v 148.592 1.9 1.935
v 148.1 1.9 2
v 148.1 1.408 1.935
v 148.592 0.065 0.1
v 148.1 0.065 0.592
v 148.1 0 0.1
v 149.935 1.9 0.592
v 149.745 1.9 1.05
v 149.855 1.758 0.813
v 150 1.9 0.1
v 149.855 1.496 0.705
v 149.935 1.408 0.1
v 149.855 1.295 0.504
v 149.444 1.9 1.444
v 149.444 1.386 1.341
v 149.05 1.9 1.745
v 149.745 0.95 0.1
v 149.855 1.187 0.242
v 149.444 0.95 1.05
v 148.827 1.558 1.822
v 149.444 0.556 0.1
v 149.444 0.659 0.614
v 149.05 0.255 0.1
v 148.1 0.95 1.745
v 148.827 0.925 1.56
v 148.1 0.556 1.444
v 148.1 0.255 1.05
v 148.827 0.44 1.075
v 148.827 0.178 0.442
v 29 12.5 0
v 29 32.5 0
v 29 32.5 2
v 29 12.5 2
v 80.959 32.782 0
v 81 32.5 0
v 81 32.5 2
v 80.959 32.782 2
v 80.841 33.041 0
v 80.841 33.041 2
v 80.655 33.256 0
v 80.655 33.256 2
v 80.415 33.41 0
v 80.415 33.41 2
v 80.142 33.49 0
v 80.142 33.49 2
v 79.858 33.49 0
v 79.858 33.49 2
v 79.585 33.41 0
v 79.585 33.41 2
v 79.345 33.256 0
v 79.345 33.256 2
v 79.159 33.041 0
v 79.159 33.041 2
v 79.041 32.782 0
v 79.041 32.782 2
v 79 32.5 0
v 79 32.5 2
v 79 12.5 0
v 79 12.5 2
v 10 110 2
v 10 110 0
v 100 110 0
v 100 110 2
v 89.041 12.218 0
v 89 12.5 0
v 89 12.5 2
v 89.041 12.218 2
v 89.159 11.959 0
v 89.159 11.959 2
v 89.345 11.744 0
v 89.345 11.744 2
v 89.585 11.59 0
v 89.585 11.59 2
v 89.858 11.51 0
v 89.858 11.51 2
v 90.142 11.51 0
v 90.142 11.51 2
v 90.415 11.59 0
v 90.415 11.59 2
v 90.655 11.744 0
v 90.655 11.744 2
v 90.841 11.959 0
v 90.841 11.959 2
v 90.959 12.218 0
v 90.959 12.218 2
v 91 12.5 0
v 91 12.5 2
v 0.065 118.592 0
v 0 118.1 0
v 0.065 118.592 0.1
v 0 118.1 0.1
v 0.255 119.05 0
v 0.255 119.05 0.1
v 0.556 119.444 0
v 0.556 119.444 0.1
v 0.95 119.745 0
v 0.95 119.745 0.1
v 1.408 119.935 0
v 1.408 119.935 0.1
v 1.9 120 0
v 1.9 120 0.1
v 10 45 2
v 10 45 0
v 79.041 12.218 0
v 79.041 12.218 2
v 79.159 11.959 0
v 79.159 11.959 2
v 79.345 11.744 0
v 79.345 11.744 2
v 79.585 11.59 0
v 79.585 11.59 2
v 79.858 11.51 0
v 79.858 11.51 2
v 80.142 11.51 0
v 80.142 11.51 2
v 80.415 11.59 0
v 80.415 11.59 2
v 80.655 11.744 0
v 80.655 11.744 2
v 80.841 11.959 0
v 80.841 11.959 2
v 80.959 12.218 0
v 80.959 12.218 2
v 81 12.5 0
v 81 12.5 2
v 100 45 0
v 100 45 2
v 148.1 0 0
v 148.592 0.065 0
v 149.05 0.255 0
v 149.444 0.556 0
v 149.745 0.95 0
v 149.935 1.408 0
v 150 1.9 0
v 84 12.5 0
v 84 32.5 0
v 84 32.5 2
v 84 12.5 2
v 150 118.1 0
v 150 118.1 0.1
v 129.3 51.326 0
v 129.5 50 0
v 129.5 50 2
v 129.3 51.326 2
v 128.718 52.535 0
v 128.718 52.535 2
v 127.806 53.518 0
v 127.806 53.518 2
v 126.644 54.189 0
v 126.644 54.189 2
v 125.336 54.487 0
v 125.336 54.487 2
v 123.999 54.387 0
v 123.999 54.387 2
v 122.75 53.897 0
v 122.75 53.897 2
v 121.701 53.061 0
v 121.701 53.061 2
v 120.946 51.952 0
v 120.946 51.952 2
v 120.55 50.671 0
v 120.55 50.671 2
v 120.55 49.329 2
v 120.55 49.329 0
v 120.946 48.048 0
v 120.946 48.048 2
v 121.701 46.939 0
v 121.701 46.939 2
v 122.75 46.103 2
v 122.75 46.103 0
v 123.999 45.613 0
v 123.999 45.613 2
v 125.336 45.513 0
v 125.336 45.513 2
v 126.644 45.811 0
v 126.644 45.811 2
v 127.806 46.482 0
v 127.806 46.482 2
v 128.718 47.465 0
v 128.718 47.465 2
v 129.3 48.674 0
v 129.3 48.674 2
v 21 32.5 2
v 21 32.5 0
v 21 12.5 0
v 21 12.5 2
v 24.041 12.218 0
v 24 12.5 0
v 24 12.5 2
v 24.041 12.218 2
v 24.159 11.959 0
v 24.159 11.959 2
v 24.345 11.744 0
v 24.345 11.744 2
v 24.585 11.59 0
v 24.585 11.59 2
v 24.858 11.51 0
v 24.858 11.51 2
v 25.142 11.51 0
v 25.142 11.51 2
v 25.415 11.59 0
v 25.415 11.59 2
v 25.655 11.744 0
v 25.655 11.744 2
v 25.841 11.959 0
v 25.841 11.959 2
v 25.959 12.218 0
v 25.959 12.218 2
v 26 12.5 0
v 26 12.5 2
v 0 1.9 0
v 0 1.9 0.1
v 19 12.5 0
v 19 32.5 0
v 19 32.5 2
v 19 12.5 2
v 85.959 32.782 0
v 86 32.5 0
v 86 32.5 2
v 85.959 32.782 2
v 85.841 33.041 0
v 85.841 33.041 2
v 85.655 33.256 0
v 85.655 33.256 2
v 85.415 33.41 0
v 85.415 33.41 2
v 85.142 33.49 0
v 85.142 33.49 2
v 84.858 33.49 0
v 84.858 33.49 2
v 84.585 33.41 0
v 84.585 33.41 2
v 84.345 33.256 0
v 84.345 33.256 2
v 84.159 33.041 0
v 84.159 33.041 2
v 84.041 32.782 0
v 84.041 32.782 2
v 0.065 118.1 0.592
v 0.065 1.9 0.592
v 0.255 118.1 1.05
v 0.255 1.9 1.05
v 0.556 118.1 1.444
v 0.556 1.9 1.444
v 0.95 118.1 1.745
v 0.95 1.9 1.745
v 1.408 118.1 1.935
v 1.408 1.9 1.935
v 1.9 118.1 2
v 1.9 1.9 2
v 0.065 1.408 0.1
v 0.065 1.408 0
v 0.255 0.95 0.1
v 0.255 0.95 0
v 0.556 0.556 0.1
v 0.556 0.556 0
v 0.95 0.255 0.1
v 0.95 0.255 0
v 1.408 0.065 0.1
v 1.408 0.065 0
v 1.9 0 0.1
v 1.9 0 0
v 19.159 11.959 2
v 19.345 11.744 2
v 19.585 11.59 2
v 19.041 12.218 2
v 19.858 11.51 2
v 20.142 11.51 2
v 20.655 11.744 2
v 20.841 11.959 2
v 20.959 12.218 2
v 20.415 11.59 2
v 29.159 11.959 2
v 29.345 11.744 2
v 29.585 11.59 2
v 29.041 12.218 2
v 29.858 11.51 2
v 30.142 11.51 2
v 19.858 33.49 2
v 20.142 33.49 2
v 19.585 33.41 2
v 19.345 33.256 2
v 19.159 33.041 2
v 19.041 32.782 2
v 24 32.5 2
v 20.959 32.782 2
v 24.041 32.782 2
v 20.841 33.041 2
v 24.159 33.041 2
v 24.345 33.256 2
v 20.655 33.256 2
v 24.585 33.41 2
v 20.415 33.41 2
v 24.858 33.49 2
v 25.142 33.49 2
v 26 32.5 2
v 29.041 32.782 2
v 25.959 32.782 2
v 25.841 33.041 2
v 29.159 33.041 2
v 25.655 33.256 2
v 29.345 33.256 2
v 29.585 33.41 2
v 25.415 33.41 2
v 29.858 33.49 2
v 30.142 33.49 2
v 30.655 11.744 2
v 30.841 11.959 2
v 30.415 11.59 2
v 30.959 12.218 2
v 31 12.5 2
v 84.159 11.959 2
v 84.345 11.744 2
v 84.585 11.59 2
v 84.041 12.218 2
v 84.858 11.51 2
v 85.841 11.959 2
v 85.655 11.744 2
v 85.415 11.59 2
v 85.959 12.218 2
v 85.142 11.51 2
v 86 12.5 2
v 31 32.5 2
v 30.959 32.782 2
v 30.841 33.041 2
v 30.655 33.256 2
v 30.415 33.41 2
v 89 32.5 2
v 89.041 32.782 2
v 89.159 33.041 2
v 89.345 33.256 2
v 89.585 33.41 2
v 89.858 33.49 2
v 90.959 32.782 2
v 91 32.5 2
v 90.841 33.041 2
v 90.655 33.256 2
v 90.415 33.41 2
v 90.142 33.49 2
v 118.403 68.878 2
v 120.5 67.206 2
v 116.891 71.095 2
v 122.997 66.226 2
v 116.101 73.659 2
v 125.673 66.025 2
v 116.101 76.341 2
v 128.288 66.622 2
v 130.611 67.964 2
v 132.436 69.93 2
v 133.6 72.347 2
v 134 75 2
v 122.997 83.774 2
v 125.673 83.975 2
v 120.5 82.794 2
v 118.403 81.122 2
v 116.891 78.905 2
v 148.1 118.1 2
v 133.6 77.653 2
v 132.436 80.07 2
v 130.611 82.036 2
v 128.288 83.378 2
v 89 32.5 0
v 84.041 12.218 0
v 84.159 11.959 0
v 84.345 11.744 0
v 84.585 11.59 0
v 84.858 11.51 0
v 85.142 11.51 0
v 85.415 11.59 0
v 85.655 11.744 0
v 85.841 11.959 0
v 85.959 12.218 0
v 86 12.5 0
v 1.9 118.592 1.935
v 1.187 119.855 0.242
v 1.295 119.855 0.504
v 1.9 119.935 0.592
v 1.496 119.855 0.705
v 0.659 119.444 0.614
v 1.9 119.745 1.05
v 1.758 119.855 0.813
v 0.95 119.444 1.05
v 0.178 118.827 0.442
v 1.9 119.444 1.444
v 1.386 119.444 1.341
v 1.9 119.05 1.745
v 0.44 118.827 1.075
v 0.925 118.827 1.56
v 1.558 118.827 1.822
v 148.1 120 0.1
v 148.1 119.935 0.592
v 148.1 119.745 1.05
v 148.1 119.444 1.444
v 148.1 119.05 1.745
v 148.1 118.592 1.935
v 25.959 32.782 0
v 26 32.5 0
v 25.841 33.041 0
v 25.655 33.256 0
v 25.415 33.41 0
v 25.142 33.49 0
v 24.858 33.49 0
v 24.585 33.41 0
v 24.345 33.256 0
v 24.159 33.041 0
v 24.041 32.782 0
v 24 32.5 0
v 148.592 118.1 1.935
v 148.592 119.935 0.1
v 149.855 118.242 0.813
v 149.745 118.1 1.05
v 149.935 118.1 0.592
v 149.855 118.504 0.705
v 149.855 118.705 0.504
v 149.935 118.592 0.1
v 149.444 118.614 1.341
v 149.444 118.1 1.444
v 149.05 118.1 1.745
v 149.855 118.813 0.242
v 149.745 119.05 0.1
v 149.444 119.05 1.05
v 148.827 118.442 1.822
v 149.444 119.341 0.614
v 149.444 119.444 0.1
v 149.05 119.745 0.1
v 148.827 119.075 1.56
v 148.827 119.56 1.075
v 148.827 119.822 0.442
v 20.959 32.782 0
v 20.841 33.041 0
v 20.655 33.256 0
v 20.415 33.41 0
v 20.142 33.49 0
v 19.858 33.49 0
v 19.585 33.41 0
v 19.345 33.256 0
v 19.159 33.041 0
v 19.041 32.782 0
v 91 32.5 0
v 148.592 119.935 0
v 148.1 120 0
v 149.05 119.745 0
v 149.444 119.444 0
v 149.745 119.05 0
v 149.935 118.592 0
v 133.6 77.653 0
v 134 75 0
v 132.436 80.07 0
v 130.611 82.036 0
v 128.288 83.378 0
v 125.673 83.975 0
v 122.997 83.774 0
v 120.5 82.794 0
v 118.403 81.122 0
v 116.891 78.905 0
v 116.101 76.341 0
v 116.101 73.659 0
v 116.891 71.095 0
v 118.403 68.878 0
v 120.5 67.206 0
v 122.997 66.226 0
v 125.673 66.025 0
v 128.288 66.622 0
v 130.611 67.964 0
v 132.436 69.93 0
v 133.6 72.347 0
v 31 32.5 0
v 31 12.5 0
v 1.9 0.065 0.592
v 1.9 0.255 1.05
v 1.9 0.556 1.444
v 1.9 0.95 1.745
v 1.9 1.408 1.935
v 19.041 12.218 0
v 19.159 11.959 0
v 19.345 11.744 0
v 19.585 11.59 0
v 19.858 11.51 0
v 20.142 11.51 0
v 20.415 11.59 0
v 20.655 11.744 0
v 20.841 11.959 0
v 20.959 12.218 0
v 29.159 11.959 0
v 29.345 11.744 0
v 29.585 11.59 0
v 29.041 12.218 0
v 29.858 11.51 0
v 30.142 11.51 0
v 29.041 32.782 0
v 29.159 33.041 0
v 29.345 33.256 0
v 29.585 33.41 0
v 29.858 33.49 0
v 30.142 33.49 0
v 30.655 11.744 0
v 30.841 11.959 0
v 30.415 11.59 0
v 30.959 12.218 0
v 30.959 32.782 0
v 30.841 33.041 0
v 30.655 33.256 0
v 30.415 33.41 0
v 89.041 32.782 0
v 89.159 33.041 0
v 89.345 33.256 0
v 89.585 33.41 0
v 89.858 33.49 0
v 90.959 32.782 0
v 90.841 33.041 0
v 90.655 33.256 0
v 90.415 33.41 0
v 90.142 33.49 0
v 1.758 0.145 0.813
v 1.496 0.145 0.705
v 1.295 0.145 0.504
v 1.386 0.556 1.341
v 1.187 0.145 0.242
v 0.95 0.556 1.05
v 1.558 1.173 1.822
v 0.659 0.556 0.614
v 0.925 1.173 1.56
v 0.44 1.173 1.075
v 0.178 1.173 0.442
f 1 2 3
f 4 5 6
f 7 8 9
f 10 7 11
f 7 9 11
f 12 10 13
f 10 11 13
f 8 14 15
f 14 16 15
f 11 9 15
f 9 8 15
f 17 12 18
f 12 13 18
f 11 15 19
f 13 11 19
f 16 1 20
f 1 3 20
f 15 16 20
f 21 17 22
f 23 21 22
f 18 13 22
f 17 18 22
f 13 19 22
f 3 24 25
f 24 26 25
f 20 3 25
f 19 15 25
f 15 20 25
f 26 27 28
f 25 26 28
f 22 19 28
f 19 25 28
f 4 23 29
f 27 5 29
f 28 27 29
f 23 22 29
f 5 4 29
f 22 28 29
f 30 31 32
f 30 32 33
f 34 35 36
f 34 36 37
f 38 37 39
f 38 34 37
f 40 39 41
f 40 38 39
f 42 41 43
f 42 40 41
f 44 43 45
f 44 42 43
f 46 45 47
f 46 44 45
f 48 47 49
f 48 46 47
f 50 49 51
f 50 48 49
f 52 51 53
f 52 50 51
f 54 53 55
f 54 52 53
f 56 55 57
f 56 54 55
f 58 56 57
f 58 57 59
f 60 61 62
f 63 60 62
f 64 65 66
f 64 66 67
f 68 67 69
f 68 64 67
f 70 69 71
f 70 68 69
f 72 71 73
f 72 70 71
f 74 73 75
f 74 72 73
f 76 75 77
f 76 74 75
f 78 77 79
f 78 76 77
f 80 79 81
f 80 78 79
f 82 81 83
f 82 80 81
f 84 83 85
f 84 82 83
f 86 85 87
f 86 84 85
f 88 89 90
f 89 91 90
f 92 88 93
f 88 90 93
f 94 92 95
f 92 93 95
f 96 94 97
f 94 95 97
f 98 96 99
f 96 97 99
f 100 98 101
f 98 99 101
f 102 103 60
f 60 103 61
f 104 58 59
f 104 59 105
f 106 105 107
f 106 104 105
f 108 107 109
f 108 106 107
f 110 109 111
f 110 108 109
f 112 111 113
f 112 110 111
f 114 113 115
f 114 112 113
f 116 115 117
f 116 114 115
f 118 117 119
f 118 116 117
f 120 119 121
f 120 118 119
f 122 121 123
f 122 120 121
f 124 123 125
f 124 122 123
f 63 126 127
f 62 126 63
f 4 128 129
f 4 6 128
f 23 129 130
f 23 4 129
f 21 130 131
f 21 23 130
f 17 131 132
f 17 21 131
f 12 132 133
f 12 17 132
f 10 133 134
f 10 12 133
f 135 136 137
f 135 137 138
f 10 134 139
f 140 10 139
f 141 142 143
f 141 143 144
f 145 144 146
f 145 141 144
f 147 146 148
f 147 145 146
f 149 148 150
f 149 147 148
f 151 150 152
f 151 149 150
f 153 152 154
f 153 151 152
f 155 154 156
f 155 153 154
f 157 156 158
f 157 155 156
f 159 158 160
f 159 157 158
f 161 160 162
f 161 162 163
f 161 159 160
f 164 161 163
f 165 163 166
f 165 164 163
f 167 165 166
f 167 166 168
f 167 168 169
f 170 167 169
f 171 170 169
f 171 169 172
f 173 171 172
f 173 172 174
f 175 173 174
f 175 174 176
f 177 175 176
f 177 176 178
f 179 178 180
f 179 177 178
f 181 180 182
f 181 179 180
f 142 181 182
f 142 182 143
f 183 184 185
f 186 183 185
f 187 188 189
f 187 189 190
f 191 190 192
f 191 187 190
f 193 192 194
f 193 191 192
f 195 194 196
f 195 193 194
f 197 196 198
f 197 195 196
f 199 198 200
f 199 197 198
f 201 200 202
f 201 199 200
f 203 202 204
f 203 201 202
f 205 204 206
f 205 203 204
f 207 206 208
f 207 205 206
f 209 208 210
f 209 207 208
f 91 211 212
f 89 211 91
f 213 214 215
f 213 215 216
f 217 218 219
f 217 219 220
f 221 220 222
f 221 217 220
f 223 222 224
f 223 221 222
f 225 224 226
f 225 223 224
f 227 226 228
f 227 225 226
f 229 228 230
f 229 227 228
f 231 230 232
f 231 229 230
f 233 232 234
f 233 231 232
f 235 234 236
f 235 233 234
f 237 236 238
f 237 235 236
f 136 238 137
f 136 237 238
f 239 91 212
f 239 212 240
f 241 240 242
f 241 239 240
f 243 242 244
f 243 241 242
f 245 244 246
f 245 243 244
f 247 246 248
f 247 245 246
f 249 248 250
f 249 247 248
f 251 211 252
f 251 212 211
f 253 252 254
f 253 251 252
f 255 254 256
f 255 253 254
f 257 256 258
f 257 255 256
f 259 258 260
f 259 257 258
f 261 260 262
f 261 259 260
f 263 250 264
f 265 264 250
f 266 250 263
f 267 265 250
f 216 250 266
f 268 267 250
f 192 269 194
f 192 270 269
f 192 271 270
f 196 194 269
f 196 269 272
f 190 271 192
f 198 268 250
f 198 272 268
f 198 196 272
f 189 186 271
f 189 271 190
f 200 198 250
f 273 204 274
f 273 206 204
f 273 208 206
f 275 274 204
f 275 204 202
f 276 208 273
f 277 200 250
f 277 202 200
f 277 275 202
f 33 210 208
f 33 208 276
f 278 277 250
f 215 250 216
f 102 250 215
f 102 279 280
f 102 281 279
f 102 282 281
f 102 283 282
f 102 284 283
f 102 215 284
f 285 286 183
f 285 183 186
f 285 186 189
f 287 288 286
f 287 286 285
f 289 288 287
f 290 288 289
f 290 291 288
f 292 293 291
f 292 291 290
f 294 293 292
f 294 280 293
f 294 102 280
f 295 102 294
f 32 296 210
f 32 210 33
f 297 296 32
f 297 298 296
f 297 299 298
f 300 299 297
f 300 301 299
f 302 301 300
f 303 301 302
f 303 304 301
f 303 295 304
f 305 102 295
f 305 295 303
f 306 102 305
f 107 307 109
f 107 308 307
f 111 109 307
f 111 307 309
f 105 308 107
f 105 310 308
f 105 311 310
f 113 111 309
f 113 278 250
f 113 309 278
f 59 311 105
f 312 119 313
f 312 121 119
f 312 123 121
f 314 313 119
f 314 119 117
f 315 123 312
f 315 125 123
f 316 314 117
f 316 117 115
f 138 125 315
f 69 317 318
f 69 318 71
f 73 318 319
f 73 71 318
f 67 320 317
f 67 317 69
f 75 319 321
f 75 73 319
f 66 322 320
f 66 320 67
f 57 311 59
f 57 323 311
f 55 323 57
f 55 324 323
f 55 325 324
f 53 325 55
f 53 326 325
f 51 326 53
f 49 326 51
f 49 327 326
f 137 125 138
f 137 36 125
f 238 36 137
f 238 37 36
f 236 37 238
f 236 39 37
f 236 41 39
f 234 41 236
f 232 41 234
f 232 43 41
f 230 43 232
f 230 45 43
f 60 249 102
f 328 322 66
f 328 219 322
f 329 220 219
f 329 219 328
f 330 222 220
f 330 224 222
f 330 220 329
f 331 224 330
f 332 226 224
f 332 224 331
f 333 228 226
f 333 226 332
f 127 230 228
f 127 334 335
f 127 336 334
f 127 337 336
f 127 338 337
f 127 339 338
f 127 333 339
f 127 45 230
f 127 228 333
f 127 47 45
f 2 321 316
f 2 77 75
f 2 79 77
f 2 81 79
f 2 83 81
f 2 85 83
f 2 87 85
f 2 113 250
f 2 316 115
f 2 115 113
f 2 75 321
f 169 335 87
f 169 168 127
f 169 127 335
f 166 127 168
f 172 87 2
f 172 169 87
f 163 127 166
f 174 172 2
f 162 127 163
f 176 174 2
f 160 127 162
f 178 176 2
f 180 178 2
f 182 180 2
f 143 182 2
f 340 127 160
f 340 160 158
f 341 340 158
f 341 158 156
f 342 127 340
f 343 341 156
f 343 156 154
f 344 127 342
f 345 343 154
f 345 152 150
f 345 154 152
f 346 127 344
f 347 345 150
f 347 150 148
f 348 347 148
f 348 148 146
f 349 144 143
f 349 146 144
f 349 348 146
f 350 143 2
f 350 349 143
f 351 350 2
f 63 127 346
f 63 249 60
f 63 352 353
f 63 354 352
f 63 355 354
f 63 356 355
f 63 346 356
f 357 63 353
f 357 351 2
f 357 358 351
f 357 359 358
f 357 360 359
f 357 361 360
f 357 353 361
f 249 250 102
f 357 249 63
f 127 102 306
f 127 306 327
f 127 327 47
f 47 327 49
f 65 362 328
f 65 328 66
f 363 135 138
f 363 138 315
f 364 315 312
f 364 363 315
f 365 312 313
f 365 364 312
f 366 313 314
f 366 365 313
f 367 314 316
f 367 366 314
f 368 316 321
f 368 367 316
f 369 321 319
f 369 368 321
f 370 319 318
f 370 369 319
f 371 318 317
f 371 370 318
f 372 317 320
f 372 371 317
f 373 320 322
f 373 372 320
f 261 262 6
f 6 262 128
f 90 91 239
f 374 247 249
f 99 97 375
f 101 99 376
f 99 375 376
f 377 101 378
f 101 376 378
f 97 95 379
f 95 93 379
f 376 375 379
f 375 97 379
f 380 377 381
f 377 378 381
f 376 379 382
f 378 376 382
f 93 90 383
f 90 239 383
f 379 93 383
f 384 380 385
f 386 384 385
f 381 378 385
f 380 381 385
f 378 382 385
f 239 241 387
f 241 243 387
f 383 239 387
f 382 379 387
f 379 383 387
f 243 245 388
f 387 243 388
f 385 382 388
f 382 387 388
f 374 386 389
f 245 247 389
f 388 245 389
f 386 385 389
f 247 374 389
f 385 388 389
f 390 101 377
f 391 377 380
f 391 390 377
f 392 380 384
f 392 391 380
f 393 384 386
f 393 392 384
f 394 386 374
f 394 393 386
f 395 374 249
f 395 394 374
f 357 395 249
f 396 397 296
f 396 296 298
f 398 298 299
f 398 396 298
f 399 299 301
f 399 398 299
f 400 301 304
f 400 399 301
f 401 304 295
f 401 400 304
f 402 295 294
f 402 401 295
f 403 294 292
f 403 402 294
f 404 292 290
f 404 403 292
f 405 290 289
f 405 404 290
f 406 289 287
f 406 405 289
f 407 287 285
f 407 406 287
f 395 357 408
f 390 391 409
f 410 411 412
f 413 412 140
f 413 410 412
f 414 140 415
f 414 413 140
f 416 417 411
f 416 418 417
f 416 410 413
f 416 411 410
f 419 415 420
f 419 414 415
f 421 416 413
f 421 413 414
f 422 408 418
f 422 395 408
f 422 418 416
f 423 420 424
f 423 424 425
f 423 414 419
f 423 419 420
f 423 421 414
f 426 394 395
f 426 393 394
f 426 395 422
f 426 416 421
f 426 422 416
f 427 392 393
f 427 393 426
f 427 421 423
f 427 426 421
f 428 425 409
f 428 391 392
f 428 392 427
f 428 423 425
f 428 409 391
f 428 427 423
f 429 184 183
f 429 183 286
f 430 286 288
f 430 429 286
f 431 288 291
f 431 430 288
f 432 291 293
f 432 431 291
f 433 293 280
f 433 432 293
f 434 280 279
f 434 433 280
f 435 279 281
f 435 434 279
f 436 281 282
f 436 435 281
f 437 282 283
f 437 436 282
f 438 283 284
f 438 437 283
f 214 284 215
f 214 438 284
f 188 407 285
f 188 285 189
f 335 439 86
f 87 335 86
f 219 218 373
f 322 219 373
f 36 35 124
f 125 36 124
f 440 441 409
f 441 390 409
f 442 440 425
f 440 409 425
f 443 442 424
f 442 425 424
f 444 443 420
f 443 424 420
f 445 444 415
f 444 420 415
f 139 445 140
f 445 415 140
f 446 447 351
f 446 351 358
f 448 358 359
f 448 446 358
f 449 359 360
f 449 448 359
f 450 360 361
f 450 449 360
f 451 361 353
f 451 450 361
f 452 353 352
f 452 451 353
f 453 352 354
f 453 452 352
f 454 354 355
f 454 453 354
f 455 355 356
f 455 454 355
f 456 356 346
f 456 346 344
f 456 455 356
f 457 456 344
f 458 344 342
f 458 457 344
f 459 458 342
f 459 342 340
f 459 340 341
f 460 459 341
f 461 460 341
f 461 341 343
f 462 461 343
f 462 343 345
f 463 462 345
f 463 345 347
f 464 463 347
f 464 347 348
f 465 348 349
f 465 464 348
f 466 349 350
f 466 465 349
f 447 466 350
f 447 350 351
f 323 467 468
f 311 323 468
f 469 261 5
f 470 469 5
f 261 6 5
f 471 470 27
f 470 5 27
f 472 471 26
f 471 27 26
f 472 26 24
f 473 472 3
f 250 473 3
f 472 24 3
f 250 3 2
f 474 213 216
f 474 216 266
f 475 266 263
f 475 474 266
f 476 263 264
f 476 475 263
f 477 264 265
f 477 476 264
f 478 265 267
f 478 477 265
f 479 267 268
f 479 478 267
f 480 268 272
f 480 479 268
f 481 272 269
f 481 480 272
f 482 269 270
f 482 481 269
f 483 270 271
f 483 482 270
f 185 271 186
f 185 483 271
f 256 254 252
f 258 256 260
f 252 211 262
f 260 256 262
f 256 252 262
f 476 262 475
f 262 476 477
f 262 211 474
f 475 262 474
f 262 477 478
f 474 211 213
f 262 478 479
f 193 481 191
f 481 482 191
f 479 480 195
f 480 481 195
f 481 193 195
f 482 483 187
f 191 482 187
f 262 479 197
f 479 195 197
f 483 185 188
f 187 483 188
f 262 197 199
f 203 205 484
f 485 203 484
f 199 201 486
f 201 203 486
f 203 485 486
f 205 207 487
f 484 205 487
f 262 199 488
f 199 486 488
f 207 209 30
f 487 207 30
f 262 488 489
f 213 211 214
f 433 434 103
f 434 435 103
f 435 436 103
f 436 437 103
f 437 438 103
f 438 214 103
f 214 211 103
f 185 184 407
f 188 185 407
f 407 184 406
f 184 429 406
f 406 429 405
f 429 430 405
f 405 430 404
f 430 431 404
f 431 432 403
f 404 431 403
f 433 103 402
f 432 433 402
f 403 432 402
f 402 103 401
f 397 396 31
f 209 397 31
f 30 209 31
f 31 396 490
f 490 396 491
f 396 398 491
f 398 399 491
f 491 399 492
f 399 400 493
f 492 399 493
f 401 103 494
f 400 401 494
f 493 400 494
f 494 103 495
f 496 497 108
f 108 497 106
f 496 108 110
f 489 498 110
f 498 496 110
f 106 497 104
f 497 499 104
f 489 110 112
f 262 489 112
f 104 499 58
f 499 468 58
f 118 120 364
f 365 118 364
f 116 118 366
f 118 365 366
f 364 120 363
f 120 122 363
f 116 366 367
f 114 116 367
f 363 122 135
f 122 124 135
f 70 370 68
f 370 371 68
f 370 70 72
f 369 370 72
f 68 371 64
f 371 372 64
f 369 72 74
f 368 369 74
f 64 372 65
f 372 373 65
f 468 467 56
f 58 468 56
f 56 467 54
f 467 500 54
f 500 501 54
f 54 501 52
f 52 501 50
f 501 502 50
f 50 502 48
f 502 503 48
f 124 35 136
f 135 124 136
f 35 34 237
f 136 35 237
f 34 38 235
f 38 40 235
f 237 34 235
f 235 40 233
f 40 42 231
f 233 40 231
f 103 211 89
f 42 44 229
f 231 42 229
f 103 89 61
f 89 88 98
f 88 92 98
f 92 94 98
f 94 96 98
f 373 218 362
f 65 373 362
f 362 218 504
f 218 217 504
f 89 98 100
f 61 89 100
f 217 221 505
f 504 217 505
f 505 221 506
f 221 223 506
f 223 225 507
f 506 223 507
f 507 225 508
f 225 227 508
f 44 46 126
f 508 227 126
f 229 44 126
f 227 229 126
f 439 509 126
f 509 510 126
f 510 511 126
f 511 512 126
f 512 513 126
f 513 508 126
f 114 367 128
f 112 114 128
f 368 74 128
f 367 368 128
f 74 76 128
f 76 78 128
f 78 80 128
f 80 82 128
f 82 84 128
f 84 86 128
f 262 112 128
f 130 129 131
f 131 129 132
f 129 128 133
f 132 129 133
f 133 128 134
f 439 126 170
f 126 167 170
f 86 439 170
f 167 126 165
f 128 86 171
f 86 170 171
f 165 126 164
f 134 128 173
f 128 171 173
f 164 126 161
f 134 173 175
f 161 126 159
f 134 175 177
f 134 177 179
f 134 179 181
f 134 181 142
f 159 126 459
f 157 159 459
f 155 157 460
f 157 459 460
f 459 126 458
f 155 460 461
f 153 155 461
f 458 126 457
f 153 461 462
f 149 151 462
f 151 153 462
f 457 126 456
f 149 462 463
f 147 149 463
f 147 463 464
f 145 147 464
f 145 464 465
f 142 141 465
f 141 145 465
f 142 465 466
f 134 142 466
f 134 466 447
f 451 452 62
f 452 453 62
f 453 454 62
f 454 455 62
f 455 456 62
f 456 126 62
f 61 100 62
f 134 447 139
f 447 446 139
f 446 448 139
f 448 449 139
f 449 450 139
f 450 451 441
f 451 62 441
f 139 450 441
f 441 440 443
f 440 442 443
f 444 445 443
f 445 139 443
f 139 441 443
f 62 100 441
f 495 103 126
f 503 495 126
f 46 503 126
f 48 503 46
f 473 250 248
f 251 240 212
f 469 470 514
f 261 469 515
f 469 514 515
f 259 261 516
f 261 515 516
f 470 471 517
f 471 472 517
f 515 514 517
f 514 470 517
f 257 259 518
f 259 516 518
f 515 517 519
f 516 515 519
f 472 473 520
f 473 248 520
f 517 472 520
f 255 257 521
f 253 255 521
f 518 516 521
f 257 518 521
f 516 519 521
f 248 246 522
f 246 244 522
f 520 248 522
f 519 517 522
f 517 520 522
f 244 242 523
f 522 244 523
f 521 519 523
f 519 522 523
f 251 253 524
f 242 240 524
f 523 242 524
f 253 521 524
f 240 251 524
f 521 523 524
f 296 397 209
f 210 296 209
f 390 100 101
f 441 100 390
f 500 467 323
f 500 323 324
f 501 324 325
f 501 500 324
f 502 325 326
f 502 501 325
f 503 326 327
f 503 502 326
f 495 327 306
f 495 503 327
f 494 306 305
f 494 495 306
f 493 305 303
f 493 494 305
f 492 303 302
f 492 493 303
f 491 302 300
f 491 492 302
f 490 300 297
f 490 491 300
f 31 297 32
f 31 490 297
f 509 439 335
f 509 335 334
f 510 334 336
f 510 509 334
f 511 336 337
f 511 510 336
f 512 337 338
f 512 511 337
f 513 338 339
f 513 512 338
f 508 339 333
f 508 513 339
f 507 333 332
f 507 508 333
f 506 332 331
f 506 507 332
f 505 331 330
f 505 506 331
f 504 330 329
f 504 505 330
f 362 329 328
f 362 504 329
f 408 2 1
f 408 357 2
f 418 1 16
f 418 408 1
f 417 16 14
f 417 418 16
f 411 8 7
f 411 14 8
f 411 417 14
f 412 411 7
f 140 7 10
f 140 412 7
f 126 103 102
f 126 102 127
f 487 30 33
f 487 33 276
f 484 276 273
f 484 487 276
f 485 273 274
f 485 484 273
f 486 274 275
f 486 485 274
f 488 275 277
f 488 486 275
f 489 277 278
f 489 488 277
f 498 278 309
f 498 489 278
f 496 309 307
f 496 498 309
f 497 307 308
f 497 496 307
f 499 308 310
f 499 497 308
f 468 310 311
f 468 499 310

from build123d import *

# Parameters (mm, degrees)
SKETCH_W        = 150
SKETCH_H        = 120
PAD_DEPTH       = 2
SKETCH001_W     = 90
SKETCH001_H     = 65
POCKET_DEPTH    = 2
SKETCH002_R     = 9
POCKET001_DEPTH = 2
SKETCH003_R     = 4.5
POCKET002_DEPTH = 2
POCKET003_DEPTH = 2
POCKET004_DEPTH = 2
POCKET005_DEPTH = 2
POCKET006_DEPTH = 2
POCKET007_DEPTH = 2
POCKET008_DEPTH = 2
FILLET_R        = 1.9


with BuildPart() as part:
    # Sketch → Pad (new body)
    with BuildSketch(Plane.XY):
        with Locations((75, 60)):
            Rectangle(SKETCH_W, SKETCH_H)
    extrude(amount=PAD_DEPTH)

    # Sketch001 → Pocket (cut)
    with BuildSketch(Plane.XY):
        with Locations((55, 77.5)):
            Rectangle(SKETCH001_W, SKETCH001_H)
    extrude(amount=POCKET_DEPTH, mode=Mode.SUBTRACT)

    # Sketch002 → Pocket001 (cut)
    with BuildSketch(Plane.XY):
        with Locations((125, 75)):
            Circle(SKETCH002_R)
    extrude(amount=POCKET001_DEPTH, mode=Mode.SUBTRACT)

    # Sketch003 → Pocket002 (cut)
    with BuildSketch(Plane.XY):
        with Locations((125, 50)):
            Circle(SKETCH003_R)
    extrude(amount=POCKET002_DEPTH, mode=Mode.SUBTRACT)

    # Sketch004 → Pocket003 (cut)
    with BuildSketch(Plane.XY):
        with BuildLine():
            ThreePointArc((21, 32.5), (20, 33.5), (19, 32.5))
            Line((19, 32.5), (19, 12.5))
            ThreePointArc((19, 12.5), (20, 11.5), (21, 12.5))
            Line((21, 32.5), (21, 12.5))
        make_face()
    extrude(amount=POCKET003_DEPTH, mode=Mode.SUBTRACT)

    # Sketch006 → Pocket004 (cut)
    with BuildSketch(Plane.XY):
        with BuildLine():
            ThreePointArc((26, 32.5), (25, 33.5), (24, 32.5))
            Line((24, 32.5), (24, 12.5))
            ThreePointArc((24, 12.5), (25, 11.5), (26, 12.5))
            Line((26, 32.5), (26, 12.5))
        make_face()
    extrude(amount=POCKET004_DEPTH, mode=Mode.SUBTRACT)

    # Sketch008 → Pocket005 (cut)
    with BuildSketch(Plane.XY):
        with BuildLine():
            ThreePointArc((31, 32.5), (30, 33.5), (29, 32.5))
            Line((29, 32.5), (29, 12.5))
            ThreePointArc((29, 12.5), (30, 11.5), (31, 12.5))
            Line((31, 32.5), (31, 12.5))
        make_face()
    extrude(amount=POCKET005_DEPTH, mode=Mode.SUBTRACT)

    # Sketch009 → Pocket006 (cut)
    with BuildSketch(Plane.XY):
        with BuildLine():
            ThreePointArc((81, 32.5), (80, 33.5), (79, 32.5))
            Line((79, 32.5), (79, 12.5))
            ThreePointArc((79, 12.5), (80, 11.5), (81, 12.5))
            Line((81, 32.5), (81, 12.5))
        make_face()
    extrude(amount=POCKET006_DEPTH, mode=Mode.SUBTRACT)

    # Sketch010 → Pocket007 (cut)
    with BuildSketch(Plane.XY):
        with BuildLine():
            ThreePointArc((86, 32.5), (85, 33.5), (84, 32.5))
            Line((84, 32.5), (84, 12.5))
            ThreePointArc((84, 12.5), (85, 11.5), (86, 12.5))
            Line((86, 32.5), (86, 12.5))
        make_face()
    extrude(amount=POCKET007_DEPTH, mode=Mode.SUBTRACT)

    # Sketch011 → Pocket008 (cut)
    with BuildSketch(Plane.XY):
        with BuildLine():
            ThreePointArc((91, 32.5), (90, 33.5), (89, 32.5))
            Line((89, 32.5), (89, 12.5))
            ThreePointArc((89, 12.5), (90, 11.5), (91, 12.5))
            Line((91, 32.5), (91, 12.5))
        make_face()
    extrude(amount=POCKET008_DEPTH, mode=Mode.SUBTRACT)

    # Fillet
    fillet_edges = [part.edges().sort_by_distance(p)[0] for p in [
        (0, 60, 2),
        (75, 0, 2),
        (0, 0, 1),
        (0, 120, 1),
        (75, 120, 2),
        (150, 60, 2),
        (150, 0, 1),
        (150, 120, 1),
    ]]
    fillet(fillet_edges, radius=FILLET_R)


solid = part.part
